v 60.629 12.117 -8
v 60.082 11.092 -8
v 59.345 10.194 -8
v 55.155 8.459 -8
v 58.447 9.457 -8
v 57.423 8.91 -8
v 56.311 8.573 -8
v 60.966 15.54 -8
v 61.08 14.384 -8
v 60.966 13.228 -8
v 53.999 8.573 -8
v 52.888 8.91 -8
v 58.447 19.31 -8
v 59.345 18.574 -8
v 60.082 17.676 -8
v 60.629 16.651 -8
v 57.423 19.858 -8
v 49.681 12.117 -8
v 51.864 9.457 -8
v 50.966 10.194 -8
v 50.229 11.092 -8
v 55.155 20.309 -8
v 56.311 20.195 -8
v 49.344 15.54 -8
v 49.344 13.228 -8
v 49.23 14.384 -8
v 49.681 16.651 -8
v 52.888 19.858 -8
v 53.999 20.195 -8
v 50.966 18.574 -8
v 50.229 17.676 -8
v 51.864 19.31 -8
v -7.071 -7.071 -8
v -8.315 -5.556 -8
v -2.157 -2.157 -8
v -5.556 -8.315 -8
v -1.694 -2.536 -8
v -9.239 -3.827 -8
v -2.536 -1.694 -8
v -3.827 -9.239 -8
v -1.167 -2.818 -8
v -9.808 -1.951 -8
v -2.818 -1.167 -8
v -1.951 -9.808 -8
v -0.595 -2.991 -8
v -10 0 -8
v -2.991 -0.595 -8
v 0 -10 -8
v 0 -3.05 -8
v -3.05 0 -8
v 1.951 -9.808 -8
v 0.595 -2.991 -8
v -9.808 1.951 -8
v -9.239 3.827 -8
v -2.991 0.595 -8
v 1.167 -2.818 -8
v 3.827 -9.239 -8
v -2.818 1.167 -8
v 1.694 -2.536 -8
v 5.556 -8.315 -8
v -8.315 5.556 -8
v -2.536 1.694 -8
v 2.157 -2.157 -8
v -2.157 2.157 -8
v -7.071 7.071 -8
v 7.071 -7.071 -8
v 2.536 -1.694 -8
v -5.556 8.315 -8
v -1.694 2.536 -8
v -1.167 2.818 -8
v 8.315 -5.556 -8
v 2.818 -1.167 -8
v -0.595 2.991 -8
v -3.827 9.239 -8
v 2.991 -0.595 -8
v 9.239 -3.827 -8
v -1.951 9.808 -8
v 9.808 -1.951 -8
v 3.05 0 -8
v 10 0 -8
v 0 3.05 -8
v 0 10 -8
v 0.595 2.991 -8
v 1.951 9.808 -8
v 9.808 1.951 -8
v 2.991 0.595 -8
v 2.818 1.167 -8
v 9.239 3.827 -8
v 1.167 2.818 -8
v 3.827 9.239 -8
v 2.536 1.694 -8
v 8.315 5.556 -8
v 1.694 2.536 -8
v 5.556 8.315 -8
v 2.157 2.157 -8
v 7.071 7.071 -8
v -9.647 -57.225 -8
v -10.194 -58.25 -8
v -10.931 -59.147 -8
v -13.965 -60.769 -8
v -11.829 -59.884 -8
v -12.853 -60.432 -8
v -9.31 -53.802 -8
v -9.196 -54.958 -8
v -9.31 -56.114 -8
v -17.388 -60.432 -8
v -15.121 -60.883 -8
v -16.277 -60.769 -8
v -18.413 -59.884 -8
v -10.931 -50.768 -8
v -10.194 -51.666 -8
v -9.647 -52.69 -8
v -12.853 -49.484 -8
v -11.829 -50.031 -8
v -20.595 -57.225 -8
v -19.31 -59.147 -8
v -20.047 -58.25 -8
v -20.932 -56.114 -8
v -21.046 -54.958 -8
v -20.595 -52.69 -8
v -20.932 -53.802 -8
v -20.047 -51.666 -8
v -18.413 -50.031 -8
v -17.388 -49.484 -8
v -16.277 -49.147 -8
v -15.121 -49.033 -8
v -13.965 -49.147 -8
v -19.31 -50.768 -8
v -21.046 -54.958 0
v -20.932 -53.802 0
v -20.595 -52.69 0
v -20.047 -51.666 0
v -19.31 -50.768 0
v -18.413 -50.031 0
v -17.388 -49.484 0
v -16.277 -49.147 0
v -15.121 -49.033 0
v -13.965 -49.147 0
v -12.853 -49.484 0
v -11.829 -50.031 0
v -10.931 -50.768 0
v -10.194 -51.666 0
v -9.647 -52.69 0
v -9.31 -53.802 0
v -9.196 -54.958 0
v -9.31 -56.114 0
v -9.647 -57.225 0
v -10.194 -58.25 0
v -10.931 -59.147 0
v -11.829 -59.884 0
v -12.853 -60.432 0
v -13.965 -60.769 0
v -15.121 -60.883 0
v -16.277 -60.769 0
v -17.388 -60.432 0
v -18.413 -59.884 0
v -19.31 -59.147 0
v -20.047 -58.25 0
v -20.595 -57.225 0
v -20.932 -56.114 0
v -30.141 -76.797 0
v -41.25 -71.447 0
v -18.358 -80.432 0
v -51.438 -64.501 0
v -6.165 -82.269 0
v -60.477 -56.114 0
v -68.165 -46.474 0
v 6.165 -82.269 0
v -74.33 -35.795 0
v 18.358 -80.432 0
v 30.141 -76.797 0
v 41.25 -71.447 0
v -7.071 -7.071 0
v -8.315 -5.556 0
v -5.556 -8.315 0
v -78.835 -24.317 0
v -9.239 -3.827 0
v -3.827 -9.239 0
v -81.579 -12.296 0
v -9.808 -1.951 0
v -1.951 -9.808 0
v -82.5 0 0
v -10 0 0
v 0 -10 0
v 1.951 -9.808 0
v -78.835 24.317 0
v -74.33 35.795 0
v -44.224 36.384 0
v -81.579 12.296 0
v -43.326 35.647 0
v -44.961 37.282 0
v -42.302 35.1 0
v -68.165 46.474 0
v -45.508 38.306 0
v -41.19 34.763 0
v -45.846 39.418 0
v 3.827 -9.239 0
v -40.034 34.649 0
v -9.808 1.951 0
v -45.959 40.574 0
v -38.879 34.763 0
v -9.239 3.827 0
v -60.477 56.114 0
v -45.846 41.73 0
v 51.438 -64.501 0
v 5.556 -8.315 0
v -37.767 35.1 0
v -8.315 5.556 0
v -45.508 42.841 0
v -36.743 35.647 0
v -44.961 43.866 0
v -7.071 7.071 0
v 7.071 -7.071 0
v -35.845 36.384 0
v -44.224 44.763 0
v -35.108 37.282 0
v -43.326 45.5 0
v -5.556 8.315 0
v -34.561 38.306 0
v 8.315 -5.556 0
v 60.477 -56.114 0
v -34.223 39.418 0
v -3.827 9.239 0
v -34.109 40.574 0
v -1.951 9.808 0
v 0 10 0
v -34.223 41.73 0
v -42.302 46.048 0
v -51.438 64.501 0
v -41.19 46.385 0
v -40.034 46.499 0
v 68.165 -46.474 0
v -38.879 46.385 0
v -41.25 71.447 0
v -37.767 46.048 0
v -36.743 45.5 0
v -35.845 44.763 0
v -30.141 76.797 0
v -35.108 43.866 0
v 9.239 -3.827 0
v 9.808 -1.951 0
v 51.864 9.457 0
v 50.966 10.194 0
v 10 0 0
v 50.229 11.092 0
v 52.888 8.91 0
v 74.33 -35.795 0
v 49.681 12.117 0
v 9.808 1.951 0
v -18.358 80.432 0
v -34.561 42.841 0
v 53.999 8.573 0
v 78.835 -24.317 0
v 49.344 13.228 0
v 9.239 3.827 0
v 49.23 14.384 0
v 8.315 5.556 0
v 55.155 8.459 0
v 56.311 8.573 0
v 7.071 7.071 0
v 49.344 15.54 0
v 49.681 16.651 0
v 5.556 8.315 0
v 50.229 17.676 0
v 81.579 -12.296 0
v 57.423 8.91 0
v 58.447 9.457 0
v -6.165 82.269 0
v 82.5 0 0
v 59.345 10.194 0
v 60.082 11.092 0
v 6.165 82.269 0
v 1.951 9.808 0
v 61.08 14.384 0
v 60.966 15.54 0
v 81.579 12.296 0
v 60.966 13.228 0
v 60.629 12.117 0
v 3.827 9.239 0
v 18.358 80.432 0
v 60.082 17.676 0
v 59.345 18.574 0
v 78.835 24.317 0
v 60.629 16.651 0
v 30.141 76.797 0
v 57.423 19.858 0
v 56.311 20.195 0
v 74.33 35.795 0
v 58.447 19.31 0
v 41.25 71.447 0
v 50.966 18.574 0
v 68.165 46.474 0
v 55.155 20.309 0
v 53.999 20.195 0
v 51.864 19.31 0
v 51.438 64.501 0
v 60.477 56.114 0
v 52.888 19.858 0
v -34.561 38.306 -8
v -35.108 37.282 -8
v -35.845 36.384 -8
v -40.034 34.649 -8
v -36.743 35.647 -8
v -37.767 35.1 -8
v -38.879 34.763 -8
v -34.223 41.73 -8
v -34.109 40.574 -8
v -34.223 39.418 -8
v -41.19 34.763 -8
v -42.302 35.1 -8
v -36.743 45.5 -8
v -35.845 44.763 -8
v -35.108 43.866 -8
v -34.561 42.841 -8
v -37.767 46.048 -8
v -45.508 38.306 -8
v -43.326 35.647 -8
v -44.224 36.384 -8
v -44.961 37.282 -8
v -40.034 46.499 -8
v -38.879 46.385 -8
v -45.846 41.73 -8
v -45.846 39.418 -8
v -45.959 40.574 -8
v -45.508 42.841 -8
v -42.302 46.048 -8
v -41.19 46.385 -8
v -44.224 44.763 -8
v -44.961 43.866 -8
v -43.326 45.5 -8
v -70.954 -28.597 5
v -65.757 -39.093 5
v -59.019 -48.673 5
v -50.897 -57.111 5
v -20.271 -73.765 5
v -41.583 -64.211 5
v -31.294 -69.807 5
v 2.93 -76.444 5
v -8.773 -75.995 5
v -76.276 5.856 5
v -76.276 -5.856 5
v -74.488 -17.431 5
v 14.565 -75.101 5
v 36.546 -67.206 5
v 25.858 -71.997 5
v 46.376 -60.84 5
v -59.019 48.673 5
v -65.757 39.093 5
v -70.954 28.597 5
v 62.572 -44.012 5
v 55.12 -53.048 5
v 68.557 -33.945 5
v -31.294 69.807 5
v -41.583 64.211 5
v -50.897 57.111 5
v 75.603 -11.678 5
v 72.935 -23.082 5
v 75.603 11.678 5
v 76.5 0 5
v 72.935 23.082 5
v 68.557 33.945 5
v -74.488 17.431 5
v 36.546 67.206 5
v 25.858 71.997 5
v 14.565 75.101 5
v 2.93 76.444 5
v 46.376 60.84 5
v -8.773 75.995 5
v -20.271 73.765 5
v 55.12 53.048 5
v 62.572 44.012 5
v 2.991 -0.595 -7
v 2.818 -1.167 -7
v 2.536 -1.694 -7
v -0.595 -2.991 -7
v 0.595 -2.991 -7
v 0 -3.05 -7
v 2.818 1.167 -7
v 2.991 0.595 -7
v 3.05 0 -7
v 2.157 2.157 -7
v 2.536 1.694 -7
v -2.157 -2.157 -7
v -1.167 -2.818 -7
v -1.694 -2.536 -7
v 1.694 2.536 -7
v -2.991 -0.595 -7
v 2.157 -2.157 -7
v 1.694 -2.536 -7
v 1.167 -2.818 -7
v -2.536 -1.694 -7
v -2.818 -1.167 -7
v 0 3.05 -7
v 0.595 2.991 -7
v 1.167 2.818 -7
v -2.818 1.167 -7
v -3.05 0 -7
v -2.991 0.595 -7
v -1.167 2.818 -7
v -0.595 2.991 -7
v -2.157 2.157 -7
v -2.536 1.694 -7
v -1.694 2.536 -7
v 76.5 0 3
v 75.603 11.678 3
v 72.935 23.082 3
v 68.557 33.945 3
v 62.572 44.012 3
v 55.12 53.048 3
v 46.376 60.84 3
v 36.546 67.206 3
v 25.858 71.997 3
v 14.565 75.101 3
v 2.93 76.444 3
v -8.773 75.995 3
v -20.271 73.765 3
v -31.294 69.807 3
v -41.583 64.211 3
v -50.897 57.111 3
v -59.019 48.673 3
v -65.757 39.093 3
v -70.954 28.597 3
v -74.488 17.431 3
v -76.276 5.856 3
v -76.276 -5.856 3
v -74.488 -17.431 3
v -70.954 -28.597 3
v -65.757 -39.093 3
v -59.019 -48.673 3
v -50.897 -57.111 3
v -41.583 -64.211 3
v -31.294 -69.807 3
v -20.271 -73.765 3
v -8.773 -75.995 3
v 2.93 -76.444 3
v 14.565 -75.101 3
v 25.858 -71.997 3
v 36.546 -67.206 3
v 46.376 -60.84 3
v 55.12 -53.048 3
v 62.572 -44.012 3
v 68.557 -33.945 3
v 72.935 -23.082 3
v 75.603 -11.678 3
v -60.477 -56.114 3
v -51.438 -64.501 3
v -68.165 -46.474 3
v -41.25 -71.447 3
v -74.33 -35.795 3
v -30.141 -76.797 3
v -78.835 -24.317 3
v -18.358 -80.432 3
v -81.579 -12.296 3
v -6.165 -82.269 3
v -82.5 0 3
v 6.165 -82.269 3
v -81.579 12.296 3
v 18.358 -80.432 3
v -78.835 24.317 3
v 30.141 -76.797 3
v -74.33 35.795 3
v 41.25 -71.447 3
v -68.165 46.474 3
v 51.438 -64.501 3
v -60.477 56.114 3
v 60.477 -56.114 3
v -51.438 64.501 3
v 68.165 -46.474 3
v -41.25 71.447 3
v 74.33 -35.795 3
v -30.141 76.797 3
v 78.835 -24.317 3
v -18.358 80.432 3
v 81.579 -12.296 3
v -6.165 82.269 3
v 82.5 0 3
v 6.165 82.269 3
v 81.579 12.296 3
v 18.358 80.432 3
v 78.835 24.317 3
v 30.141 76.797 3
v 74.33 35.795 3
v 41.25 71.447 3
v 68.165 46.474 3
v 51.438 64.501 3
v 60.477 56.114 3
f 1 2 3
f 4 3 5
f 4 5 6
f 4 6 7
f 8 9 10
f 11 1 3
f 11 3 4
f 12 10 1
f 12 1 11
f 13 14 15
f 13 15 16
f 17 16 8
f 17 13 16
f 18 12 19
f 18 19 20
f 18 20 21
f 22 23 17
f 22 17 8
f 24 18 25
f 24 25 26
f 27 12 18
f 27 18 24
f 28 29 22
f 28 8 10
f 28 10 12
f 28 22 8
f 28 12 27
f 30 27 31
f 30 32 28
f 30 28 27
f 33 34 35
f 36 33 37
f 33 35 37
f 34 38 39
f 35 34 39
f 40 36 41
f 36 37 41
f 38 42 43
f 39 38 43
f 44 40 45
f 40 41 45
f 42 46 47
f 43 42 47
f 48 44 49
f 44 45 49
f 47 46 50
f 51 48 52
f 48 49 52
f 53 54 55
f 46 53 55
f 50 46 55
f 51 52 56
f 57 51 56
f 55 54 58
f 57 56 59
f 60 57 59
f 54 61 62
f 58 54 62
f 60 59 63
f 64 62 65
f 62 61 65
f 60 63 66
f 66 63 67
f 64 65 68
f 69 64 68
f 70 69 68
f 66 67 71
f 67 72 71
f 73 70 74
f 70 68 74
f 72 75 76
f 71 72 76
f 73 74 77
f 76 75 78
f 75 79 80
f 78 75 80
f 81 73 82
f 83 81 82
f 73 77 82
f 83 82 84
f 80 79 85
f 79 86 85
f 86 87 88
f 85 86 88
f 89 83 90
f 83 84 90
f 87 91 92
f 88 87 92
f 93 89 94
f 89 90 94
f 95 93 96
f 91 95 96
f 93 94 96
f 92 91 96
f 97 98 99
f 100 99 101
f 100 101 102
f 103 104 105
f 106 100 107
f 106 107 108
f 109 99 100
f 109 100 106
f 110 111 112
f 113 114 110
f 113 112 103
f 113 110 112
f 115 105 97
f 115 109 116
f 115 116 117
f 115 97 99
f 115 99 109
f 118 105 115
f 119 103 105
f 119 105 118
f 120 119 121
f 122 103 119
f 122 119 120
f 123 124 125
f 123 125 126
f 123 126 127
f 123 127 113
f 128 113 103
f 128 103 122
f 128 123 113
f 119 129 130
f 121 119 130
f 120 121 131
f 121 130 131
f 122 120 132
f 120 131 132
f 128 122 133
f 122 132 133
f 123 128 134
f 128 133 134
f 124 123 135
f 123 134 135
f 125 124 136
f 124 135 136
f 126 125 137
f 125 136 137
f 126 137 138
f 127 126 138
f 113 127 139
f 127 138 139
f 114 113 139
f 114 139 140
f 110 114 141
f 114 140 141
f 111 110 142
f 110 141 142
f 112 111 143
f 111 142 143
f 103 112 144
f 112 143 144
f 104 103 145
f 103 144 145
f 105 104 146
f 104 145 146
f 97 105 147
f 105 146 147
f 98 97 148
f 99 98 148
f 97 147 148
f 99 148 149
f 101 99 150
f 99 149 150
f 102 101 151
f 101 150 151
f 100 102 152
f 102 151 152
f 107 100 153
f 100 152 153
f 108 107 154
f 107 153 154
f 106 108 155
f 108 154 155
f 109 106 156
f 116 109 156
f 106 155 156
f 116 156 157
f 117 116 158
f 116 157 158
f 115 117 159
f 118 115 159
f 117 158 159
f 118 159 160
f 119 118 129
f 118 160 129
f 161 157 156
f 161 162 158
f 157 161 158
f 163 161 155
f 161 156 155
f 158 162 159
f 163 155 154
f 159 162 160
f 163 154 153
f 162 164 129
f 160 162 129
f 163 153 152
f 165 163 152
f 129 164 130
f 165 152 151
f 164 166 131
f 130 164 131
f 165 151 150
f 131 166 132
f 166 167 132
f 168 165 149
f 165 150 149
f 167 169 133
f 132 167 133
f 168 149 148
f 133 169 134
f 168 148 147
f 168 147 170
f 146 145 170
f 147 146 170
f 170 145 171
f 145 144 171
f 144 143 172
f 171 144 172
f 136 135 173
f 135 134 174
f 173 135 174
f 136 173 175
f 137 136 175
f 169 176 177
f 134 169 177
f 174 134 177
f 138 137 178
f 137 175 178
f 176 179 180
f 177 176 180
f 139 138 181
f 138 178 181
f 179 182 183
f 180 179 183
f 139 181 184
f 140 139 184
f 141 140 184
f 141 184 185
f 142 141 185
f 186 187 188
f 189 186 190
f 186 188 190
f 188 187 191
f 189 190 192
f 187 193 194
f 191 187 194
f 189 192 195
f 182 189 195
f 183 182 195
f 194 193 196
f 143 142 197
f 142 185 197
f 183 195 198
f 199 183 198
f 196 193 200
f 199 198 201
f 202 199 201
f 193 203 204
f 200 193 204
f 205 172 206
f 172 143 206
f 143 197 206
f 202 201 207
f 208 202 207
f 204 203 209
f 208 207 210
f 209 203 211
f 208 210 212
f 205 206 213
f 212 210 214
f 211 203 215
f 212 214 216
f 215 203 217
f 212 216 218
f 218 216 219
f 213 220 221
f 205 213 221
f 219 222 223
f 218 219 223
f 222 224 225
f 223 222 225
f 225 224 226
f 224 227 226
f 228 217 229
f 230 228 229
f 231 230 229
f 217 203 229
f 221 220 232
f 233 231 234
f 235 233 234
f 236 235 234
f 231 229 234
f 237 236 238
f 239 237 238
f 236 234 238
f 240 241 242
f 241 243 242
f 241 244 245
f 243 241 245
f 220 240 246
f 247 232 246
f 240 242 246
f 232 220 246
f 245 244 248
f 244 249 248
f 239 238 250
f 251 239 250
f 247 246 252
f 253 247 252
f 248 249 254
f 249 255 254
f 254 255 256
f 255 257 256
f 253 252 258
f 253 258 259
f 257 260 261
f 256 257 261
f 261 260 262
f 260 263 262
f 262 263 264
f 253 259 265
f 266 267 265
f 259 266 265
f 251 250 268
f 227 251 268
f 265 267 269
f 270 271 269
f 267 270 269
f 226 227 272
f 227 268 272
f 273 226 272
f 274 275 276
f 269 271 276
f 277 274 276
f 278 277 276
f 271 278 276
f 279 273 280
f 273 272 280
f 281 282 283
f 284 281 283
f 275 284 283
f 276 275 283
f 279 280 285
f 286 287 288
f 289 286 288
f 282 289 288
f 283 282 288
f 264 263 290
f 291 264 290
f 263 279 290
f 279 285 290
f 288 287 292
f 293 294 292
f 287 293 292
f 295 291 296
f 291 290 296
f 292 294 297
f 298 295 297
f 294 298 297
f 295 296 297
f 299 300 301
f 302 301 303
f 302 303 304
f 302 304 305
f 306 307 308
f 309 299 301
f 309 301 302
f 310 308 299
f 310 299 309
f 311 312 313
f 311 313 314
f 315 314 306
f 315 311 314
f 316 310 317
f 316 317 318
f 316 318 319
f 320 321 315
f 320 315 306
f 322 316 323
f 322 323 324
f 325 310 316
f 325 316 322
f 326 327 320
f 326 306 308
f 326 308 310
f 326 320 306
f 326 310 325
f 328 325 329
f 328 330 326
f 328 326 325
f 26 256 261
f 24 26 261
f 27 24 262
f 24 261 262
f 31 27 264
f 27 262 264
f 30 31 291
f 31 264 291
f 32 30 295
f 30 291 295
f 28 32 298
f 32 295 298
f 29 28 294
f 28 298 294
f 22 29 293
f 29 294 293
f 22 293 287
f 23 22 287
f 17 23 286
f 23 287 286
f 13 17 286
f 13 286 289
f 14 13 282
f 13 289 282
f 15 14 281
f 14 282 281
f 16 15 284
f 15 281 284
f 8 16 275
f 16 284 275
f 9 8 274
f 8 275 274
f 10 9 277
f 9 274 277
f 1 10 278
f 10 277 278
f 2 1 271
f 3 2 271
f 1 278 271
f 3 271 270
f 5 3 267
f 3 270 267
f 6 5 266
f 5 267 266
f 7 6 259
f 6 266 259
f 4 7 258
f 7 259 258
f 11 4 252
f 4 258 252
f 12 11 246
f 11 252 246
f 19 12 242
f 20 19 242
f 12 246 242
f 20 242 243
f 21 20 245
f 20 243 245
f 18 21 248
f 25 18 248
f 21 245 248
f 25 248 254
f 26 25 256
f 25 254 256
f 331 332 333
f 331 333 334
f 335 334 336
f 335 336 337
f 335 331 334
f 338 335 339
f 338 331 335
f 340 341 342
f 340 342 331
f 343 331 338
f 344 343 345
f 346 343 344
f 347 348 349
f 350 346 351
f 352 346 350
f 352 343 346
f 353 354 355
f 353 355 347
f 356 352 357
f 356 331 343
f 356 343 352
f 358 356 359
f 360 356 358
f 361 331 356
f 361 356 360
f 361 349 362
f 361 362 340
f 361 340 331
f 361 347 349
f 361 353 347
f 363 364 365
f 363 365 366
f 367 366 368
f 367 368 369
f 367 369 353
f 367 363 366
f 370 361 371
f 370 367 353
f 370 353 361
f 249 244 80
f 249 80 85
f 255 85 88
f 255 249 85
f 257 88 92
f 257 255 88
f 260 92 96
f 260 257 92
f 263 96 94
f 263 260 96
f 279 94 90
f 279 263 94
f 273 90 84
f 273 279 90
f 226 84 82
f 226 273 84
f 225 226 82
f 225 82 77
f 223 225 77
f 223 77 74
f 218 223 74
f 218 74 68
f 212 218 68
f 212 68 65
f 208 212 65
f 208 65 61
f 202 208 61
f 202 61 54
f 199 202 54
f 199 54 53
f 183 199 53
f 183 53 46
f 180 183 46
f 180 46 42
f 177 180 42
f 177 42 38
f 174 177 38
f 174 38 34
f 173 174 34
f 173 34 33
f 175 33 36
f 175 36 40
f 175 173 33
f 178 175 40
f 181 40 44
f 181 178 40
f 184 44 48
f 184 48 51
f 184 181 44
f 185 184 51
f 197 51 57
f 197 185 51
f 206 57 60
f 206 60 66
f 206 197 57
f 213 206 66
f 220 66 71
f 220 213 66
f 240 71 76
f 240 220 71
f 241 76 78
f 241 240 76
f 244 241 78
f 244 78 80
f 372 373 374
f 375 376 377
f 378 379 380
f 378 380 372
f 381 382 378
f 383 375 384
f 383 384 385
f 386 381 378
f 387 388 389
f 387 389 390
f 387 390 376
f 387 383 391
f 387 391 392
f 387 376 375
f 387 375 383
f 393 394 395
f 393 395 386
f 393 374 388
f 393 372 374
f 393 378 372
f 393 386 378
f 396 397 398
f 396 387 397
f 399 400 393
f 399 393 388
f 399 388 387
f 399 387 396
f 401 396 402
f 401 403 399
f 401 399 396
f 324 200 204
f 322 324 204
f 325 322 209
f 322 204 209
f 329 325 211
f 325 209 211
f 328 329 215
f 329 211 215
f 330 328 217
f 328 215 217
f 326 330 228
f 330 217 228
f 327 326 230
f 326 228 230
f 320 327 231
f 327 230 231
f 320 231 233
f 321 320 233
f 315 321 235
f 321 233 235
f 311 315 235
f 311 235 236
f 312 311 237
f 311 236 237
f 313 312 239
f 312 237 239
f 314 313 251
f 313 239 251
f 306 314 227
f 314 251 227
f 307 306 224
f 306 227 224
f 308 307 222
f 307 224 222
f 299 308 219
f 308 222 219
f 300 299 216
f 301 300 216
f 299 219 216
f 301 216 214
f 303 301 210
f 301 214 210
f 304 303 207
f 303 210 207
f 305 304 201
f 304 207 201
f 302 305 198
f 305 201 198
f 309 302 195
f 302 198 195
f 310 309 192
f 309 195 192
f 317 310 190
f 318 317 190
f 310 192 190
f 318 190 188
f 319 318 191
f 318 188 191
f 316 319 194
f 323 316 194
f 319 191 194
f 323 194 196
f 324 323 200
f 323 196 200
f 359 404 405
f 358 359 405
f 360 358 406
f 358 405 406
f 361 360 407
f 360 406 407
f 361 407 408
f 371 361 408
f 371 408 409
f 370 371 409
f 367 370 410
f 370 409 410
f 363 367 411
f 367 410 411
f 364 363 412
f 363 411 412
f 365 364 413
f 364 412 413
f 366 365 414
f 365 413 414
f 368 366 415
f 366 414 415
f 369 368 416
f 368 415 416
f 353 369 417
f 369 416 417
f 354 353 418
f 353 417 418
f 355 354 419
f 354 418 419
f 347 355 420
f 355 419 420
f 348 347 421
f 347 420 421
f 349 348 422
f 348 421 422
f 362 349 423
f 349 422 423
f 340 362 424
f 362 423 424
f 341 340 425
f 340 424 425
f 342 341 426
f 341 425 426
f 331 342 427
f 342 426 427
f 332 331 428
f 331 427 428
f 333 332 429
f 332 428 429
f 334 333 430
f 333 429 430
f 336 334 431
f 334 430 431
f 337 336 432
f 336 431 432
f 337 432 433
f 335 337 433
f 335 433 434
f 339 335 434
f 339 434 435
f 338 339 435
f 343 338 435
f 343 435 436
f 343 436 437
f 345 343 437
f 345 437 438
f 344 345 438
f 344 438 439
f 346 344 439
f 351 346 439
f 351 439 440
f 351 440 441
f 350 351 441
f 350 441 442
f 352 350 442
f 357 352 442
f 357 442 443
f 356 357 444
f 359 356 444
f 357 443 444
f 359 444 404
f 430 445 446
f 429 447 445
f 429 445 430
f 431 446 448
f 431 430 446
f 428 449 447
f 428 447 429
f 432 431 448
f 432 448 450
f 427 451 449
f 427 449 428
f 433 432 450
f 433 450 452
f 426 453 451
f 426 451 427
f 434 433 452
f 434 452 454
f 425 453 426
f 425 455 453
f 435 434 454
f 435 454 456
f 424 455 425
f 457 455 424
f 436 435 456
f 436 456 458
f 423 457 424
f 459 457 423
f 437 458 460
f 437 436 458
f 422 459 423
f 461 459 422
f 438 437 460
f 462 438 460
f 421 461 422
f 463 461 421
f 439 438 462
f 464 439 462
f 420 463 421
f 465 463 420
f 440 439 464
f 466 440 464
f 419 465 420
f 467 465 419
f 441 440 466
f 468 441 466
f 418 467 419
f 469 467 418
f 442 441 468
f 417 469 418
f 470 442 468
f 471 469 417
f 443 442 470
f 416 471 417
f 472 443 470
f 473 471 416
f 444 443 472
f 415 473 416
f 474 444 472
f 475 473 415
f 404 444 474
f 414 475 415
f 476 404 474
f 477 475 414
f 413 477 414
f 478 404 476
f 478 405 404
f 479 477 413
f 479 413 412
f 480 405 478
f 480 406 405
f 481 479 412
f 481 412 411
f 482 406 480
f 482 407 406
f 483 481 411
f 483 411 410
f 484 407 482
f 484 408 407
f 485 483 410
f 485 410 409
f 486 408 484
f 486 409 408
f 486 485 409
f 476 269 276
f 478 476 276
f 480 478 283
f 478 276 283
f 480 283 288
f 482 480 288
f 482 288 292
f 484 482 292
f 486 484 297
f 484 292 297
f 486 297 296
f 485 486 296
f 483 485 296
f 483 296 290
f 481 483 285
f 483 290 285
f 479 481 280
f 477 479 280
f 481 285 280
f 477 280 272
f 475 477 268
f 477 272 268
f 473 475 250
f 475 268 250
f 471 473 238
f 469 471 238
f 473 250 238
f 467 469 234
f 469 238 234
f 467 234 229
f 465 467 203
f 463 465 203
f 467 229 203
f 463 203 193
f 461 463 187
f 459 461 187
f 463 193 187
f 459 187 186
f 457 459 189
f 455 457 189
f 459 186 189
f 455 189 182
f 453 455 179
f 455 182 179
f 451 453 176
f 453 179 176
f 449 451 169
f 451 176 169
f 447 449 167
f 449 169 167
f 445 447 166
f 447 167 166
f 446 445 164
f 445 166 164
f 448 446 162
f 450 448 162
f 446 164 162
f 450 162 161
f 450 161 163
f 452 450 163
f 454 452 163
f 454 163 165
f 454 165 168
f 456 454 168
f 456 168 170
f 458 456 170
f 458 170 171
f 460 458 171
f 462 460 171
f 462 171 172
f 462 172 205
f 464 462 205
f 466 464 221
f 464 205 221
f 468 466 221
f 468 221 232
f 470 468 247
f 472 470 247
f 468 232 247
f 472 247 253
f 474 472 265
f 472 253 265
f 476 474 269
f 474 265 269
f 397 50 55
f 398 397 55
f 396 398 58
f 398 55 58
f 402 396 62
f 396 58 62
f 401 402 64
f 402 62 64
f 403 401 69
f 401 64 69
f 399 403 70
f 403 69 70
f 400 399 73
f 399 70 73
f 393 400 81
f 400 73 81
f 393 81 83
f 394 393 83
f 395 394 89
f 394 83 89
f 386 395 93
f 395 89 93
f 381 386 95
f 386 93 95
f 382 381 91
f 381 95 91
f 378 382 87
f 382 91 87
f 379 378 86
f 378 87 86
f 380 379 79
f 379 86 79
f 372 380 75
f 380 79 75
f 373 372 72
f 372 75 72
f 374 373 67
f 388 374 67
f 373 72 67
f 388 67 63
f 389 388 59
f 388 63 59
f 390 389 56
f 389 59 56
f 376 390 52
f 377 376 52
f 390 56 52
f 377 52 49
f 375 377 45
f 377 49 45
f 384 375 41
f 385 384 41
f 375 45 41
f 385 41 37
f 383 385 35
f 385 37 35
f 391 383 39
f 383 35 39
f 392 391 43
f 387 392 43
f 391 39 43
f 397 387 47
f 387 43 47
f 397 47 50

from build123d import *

# Parameters (mm, degrees)
ESBO_O1_R                = 82.5
ESBO_O1_R_2              = 14
RESSALTO_EXTRUS_O1_DEPTH = 3
ESBO_O2_R                = 5.925
RESSALTO_EXTRUS_O2_DEPTH = 8
ESBO_O3_R                = 14
RESSALTO_EXTRUS_O3_DEPTH = 3
ESBO_O4_R                = 10
RESSALTO_EXTRUS_O4_DEPTH = 11
ESBO_O5_R                = 3.05
CORTE_EXTRUS_O1_DEPTH    = 1
ESBO_O6_R                = 76.5
RESSALTO_EXTRUS_O5_DEPTH = 2


with BuildPart() as part:
    # Esboço1 → Ressalto-extrusão1 (new body)
    with BuildSketch(Plane.XY):
        Circle(ESBO_O1_R)
        Circle(ESBO_O1_R_2, mode=Mode.SUBTRACT)
    extrude(amount=RESSALTO_EXTRUS_O1_DEPTH)

    # Esboço2 → Ressalto-extrusão2 (add)
    with BuildSketch(Plane(origin=(0, 0, 0), x_dir=(-1, 0, 0), z_dir=(0, 0, -1))):
        with Locations((-55.155254038, 14.383947721)):
            Circle(ESBO_O2_R)
        with Locations((40.034491152, 40.573877288)):
            Circle(ESBO_O2_R)
        with Locations((15.120762886, -54.957825009)):
            Circle(ESBO_O2_R)
    extrude(amount=RESSALTO_EXTRUS_O2_DEPTH)

    # Esboço3 → Ressalto-extrusão3 (add)
    with BuildSketch(Plane.XY.offset(3)):
        Circle(ESBO_O3_R)
    extrude(amount=-RESSALTO_EXTRUS_O3_DEPTH)

    # Esboço4 → Ressalto-extrusão4 (add)
    with BuildSketch(Plane.XY.offset(3)):
        Circle(ESBO_O4_R)
    extrude(amount=-RESSALTO_EXTRUS_O4_DEPTH)

    # Esboço5 → Corte-extrusão1 (cut)
    with BuildSketch(Plane(origin=(0, 0, -8), x_dir=(-1, 0, 0), z_dir=(0, 0, -1))):
        Circle(ESBO_O5_R)
    extrude(amount=-CORTE_EXTRUS_O1_DEPTH, mode=Mode.SUBTRACT)

    # Esboço6 → Ressalto-extrusão5 (add)
    with BuildSketch(Plane.XY.offset(3)):
        Circle(ESBO_O6_R)
    extrude(amount=RESSALTO_EXTRUS_O5_DEPTH)


solid = part.part
